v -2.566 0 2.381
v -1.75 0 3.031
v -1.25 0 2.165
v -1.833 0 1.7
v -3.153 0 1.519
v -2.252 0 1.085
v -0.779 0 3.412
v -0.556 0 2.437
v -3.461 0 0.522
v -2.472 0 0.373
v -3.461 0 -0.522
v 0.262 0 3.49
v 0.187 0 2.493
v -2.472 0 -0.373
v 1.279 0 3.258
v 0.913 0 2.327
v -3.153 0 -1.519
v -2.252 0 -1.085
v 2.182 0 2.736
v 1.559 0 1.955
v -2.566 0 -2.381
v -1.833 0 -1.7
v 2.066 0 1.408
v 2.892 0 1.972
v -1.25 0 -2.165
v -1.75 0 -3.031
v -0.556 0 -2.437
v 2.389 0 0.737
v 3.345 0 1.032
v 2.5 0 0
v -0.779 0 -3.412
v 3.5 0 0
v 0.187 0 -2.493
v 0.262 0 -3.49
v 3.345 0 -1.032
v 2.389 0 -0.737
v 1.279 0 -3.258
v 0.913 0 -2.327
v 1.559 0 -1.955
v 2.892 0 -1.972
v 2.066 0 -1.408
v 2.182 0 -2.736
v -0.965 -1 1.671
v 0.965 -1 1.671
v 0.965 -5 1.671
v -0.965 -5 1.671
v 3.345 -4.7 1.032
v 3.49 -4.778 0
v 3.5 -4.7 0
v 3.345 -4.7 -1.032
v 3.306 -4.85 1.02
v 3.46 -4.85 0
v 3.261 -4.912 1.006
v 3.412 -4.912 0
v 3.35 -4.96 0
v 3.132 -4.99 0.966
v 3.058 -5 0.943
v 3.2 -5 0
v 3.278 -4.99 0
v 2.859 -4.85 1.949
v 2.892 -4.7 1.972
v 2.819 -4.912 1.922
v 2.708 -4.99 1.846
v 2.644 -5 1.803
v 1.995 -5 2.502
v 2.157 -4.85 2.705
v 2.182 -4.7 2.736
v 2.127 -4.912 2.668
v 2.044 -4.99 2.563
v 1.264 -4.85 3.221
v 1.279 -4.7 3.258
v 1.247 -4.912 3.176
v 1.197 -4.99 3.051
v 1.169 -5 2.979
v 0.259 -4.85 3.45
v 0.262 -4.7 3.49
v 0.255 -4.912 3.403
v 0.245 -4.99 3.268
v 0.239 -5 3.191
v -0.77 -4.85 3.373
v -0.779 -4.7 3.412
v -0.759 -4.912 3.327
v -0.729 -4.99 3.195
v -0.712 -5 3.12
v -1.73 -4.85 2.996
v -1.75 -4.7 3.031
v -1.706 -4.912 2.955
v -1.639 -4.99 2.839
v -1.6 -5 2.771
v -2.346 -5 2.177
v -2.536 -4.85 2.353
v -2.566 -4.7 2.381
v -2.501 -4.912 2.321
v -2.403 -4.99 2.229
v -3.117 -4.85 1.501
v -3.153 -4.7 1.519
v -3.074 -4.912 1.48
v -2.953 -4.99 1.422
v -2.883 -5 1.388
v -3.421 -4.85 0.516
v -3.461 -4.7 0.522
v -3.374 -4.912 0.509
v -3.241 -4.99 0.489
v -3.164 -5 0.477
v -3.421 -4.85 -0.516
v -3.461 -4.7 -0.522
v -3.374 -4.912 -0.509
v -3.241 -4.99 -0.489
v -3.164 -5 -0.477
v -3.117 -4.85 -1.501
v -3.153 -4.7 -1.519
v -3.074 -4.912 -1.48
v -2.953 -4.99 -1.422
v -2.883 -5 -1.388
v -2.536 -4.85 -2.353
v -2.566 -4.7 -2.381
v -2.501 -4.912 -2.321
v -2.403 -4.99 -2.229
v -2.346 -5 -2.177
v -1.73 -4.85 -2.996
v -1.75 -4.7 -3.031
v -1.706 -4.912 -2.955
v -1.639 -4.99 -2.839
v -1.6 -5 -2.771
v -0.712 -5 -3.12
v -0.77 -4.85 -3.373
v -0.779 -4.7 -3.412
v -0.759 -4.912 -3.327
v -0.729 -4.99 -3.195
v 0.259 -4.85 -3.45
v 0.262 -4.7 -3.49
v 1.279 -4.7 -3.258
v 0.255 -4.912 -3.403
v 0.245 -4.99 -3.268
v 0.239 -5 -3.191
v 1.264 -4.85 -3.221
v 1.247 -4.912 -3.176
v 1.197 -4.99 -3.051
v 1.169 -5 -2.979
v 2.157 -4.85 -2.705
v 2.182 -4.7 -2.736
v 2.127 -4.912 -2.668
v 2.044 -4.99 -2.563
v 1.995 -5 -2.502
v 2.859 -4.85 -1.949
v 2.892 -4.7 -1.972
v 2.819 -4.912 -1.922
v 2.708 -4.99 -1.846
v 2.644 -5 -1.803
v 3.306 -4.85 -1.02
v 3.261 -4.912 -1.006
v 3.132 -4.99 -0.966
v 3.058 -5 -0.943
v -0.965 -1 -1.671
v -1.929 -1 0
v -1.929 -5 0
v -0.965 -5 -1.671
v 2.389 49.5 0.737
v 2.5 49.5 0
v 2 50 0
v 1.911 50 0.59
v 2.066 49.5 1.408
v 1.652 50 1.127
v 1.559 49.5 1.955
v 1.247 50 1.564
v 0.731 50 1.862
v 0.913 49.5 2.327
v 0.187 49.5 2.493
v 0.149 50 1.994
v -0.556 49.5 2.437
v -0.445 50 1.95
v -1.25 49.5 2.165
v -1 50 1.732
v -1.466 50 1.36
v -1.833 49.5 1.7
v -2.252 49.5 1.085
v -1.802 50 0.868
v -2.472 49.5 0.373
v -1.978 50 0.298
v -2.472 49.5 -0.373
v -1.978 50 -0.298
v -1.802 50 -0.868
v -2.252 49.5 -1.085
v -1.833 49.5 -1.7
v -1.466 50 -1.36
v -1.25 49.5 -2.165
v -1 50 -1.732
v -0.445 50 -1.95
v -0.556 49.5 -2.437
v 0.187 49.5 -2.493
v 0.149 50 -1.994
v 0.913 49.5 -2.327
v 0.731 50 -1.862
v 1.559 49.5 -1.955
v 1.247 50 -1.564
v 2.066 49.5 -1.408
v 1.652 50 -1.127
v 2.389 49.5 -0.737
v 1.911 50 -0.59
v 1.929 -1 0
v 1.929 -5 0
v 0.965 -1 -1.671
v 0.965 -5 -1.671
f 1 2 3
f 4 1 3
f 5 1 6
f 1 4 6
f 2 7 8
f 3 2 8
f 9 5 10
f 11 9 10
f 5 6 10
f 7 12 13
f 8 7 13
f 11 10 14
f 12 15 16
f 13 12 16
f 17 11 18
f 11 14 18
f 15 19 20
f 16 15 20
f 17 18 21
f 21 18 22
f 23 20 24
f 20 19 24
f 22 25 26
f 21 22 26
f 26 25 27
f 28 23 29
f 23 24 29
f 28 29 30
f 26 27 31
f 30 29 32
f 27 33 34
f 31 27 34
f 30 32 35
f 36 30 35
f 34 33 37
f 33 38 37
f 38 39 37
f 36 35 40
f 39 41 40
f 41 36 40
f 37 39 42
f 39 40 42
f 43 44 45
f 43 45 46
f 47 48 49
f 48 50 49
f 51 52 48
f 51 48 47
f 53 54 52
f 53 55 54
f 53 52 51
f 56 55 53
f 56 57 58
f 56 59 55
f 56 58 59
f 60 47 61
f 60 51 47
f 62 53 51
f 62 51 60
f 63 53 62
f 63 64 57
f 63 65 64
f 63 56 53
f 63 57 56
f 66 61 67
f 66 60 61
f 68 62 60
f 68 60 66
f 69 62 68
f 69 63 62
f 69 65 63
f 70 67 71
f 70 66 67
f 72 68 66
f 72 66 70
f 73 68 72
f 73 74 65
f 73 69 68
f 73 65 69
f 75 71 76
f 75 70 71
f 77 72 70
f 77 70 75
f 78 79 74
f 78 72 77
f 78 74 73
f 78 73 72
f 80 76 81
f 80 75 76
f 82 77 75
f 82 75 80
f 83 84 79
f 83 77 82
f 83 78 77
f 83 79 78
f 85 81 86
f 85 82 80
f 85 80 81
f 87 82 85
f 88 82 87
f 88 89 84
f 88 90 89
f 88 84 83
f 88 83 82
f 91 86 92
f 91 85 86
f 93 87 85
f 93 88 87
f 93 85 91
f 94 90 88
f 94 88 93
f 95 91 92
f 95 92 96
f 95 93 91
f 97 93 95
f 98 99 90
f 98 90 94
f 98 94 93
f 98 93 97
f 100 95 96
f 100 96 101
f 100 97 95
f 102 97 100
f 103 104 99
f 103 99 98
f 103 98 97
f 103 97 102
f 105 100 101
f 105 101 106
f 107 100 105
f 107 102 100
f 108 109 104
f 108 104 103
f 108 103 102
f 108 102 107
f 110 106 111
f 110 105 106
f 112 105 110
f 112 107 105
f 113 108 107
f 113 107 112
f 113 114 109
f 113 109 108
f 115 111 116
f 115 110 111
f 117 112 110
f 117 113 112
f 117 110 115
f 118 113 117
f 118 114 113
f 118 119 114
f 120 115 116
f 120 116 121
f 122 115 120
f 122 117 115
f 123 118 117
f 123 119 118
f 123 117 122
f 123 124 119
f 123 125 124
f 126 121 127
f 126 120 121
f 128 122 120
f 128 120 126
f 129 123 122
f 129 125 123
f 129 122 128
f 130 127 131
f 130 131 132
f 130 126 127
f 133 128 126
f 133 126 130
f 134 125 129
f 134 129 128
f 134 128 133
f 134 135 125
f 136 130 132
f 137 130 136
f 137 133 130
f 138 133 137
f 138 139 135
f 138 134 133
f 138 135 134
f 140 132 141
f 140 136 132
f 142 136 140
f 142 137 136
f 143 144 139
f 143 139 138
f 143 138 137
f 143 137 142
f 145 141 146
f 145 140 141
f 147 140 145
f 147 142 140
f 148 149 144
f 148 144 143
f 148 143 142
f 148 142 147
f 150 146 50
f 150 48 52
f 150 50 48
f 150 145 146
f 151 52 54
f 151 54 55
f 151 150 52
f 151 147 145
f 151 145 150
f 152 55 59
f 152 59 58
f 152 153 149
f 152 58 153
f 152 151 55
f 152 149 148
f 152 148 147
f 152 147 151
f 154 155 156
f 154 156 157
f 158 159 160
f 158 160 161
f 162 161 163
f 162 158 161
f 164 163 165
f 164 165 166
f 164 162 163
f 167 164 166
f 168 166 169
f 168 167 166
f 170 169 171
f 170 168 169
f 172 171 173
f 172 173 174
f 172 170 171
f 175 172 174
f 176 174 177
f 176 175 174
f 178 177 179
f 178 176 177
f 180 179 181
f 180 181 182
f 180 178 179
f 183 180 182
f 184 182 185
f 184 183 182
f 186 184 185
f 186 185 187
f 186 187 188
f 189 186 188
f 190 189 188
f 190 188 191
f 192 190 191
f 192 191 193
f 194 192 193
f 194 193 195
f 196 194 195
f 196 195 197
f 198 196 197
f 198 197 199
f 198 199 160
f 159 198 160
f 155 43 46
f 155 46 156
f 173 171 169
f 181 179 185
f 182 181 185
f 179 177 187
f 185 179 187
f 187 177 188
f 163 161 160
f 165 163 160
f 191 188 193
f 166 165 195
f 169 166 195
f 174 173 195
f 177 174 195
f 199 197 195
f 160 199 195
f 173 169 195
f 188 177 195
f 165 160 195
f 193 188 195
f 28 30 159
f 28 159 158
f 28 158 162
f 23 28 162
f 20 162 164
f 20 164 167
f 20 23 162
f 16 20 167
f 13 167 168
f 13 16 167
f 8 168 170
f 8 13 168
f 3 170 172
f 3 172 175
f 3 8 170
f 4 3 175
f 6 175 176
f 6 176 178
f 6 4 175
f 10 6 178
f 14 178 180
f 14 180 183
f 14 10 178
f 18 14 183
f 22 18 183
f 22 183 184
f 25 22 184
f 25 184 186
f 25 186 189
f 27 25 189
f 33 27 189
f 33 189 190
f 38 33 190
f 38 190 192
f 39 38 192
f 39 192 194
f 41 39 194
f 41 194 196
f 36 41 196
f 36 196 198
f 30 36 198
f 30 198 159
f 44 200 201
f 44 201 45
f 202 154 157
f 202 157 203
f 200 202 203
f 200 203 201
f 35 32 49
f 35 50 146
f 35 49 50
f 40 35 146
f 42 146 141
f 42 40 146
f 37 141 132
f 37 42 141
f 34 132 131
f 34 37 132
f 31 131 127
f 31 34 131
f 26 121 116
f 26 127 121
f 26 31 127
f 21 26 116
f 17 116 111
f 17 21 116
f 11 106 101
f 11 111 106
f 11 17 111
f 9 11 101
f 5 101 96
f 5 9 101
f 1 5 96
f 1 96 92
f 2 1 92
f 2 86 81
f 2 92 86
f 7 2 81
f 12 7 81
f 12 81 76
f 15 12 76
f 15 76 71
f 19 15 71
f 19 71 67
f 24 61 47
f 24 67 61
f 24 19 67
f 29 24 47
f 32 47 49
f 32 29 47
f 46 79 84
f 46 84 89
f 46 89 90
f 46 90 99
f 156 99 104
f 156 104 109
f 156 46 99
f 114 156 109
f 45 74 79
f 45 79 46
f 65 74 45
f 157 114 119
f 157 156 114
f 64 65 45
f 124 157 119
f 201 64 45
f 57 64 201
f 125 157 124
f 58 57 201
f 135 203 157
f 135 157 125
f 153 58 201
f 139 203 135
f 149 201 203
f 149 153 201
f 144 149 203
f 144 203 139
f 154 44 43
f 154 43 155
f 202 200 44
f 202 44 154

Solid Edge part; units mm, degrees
sketch "Sketch1" plane through (0, 0, 0) normal (0, -1, 0) x (1, 0, 0)
  circle A0 centre (0, 0) radius 2.5
extrude "Protrusion1" add sketch "Sketch1" against normal blind 50
sketch "Sketch2" plane through (0, 0, 0) normal (0, -1, 0) x (1, 0, 0)
  circle A0 centre (0, 0) radius 3.5
extrude "ExtrudedProtrusion_2" add sketch "Sketch2" along normal blind 5
fillet "Round_1" radius 0.3 1 edges at (-3.5, -5, 0)
chamfer "Chamfer_1" distance 0.5 angle 45 1 edges at (-2.5, 50, 0) measured on face at (-1.6167, 50, 1.7167)
sketch "Sketch3" plane through (0, -5, 0) normal (0, -1, 0) x (1, 0, 0)
  line L0 (-0.9646, 1.6708) -> (-1.9293, 0)
  line L1 (-1.9293, 0) -> (-0.9646, -1.6708)
  line L2 (-0.9646, -1.6708) -> (0.9646, -1.6708)
  line L3 (0.9646, -1.6708) -> (1.9293, 0)
  line L4 (1.9293, 0) -> (0.9646, 1.6708)
  line L5 (0.9646, 1.6708) -> (-0.9646, 1.6708)
extrude "ExtrudedCutout_1" cut sketch "Sketch3" along normal mid plane 8
cosmetic_thread "Thread1" size "M5"
